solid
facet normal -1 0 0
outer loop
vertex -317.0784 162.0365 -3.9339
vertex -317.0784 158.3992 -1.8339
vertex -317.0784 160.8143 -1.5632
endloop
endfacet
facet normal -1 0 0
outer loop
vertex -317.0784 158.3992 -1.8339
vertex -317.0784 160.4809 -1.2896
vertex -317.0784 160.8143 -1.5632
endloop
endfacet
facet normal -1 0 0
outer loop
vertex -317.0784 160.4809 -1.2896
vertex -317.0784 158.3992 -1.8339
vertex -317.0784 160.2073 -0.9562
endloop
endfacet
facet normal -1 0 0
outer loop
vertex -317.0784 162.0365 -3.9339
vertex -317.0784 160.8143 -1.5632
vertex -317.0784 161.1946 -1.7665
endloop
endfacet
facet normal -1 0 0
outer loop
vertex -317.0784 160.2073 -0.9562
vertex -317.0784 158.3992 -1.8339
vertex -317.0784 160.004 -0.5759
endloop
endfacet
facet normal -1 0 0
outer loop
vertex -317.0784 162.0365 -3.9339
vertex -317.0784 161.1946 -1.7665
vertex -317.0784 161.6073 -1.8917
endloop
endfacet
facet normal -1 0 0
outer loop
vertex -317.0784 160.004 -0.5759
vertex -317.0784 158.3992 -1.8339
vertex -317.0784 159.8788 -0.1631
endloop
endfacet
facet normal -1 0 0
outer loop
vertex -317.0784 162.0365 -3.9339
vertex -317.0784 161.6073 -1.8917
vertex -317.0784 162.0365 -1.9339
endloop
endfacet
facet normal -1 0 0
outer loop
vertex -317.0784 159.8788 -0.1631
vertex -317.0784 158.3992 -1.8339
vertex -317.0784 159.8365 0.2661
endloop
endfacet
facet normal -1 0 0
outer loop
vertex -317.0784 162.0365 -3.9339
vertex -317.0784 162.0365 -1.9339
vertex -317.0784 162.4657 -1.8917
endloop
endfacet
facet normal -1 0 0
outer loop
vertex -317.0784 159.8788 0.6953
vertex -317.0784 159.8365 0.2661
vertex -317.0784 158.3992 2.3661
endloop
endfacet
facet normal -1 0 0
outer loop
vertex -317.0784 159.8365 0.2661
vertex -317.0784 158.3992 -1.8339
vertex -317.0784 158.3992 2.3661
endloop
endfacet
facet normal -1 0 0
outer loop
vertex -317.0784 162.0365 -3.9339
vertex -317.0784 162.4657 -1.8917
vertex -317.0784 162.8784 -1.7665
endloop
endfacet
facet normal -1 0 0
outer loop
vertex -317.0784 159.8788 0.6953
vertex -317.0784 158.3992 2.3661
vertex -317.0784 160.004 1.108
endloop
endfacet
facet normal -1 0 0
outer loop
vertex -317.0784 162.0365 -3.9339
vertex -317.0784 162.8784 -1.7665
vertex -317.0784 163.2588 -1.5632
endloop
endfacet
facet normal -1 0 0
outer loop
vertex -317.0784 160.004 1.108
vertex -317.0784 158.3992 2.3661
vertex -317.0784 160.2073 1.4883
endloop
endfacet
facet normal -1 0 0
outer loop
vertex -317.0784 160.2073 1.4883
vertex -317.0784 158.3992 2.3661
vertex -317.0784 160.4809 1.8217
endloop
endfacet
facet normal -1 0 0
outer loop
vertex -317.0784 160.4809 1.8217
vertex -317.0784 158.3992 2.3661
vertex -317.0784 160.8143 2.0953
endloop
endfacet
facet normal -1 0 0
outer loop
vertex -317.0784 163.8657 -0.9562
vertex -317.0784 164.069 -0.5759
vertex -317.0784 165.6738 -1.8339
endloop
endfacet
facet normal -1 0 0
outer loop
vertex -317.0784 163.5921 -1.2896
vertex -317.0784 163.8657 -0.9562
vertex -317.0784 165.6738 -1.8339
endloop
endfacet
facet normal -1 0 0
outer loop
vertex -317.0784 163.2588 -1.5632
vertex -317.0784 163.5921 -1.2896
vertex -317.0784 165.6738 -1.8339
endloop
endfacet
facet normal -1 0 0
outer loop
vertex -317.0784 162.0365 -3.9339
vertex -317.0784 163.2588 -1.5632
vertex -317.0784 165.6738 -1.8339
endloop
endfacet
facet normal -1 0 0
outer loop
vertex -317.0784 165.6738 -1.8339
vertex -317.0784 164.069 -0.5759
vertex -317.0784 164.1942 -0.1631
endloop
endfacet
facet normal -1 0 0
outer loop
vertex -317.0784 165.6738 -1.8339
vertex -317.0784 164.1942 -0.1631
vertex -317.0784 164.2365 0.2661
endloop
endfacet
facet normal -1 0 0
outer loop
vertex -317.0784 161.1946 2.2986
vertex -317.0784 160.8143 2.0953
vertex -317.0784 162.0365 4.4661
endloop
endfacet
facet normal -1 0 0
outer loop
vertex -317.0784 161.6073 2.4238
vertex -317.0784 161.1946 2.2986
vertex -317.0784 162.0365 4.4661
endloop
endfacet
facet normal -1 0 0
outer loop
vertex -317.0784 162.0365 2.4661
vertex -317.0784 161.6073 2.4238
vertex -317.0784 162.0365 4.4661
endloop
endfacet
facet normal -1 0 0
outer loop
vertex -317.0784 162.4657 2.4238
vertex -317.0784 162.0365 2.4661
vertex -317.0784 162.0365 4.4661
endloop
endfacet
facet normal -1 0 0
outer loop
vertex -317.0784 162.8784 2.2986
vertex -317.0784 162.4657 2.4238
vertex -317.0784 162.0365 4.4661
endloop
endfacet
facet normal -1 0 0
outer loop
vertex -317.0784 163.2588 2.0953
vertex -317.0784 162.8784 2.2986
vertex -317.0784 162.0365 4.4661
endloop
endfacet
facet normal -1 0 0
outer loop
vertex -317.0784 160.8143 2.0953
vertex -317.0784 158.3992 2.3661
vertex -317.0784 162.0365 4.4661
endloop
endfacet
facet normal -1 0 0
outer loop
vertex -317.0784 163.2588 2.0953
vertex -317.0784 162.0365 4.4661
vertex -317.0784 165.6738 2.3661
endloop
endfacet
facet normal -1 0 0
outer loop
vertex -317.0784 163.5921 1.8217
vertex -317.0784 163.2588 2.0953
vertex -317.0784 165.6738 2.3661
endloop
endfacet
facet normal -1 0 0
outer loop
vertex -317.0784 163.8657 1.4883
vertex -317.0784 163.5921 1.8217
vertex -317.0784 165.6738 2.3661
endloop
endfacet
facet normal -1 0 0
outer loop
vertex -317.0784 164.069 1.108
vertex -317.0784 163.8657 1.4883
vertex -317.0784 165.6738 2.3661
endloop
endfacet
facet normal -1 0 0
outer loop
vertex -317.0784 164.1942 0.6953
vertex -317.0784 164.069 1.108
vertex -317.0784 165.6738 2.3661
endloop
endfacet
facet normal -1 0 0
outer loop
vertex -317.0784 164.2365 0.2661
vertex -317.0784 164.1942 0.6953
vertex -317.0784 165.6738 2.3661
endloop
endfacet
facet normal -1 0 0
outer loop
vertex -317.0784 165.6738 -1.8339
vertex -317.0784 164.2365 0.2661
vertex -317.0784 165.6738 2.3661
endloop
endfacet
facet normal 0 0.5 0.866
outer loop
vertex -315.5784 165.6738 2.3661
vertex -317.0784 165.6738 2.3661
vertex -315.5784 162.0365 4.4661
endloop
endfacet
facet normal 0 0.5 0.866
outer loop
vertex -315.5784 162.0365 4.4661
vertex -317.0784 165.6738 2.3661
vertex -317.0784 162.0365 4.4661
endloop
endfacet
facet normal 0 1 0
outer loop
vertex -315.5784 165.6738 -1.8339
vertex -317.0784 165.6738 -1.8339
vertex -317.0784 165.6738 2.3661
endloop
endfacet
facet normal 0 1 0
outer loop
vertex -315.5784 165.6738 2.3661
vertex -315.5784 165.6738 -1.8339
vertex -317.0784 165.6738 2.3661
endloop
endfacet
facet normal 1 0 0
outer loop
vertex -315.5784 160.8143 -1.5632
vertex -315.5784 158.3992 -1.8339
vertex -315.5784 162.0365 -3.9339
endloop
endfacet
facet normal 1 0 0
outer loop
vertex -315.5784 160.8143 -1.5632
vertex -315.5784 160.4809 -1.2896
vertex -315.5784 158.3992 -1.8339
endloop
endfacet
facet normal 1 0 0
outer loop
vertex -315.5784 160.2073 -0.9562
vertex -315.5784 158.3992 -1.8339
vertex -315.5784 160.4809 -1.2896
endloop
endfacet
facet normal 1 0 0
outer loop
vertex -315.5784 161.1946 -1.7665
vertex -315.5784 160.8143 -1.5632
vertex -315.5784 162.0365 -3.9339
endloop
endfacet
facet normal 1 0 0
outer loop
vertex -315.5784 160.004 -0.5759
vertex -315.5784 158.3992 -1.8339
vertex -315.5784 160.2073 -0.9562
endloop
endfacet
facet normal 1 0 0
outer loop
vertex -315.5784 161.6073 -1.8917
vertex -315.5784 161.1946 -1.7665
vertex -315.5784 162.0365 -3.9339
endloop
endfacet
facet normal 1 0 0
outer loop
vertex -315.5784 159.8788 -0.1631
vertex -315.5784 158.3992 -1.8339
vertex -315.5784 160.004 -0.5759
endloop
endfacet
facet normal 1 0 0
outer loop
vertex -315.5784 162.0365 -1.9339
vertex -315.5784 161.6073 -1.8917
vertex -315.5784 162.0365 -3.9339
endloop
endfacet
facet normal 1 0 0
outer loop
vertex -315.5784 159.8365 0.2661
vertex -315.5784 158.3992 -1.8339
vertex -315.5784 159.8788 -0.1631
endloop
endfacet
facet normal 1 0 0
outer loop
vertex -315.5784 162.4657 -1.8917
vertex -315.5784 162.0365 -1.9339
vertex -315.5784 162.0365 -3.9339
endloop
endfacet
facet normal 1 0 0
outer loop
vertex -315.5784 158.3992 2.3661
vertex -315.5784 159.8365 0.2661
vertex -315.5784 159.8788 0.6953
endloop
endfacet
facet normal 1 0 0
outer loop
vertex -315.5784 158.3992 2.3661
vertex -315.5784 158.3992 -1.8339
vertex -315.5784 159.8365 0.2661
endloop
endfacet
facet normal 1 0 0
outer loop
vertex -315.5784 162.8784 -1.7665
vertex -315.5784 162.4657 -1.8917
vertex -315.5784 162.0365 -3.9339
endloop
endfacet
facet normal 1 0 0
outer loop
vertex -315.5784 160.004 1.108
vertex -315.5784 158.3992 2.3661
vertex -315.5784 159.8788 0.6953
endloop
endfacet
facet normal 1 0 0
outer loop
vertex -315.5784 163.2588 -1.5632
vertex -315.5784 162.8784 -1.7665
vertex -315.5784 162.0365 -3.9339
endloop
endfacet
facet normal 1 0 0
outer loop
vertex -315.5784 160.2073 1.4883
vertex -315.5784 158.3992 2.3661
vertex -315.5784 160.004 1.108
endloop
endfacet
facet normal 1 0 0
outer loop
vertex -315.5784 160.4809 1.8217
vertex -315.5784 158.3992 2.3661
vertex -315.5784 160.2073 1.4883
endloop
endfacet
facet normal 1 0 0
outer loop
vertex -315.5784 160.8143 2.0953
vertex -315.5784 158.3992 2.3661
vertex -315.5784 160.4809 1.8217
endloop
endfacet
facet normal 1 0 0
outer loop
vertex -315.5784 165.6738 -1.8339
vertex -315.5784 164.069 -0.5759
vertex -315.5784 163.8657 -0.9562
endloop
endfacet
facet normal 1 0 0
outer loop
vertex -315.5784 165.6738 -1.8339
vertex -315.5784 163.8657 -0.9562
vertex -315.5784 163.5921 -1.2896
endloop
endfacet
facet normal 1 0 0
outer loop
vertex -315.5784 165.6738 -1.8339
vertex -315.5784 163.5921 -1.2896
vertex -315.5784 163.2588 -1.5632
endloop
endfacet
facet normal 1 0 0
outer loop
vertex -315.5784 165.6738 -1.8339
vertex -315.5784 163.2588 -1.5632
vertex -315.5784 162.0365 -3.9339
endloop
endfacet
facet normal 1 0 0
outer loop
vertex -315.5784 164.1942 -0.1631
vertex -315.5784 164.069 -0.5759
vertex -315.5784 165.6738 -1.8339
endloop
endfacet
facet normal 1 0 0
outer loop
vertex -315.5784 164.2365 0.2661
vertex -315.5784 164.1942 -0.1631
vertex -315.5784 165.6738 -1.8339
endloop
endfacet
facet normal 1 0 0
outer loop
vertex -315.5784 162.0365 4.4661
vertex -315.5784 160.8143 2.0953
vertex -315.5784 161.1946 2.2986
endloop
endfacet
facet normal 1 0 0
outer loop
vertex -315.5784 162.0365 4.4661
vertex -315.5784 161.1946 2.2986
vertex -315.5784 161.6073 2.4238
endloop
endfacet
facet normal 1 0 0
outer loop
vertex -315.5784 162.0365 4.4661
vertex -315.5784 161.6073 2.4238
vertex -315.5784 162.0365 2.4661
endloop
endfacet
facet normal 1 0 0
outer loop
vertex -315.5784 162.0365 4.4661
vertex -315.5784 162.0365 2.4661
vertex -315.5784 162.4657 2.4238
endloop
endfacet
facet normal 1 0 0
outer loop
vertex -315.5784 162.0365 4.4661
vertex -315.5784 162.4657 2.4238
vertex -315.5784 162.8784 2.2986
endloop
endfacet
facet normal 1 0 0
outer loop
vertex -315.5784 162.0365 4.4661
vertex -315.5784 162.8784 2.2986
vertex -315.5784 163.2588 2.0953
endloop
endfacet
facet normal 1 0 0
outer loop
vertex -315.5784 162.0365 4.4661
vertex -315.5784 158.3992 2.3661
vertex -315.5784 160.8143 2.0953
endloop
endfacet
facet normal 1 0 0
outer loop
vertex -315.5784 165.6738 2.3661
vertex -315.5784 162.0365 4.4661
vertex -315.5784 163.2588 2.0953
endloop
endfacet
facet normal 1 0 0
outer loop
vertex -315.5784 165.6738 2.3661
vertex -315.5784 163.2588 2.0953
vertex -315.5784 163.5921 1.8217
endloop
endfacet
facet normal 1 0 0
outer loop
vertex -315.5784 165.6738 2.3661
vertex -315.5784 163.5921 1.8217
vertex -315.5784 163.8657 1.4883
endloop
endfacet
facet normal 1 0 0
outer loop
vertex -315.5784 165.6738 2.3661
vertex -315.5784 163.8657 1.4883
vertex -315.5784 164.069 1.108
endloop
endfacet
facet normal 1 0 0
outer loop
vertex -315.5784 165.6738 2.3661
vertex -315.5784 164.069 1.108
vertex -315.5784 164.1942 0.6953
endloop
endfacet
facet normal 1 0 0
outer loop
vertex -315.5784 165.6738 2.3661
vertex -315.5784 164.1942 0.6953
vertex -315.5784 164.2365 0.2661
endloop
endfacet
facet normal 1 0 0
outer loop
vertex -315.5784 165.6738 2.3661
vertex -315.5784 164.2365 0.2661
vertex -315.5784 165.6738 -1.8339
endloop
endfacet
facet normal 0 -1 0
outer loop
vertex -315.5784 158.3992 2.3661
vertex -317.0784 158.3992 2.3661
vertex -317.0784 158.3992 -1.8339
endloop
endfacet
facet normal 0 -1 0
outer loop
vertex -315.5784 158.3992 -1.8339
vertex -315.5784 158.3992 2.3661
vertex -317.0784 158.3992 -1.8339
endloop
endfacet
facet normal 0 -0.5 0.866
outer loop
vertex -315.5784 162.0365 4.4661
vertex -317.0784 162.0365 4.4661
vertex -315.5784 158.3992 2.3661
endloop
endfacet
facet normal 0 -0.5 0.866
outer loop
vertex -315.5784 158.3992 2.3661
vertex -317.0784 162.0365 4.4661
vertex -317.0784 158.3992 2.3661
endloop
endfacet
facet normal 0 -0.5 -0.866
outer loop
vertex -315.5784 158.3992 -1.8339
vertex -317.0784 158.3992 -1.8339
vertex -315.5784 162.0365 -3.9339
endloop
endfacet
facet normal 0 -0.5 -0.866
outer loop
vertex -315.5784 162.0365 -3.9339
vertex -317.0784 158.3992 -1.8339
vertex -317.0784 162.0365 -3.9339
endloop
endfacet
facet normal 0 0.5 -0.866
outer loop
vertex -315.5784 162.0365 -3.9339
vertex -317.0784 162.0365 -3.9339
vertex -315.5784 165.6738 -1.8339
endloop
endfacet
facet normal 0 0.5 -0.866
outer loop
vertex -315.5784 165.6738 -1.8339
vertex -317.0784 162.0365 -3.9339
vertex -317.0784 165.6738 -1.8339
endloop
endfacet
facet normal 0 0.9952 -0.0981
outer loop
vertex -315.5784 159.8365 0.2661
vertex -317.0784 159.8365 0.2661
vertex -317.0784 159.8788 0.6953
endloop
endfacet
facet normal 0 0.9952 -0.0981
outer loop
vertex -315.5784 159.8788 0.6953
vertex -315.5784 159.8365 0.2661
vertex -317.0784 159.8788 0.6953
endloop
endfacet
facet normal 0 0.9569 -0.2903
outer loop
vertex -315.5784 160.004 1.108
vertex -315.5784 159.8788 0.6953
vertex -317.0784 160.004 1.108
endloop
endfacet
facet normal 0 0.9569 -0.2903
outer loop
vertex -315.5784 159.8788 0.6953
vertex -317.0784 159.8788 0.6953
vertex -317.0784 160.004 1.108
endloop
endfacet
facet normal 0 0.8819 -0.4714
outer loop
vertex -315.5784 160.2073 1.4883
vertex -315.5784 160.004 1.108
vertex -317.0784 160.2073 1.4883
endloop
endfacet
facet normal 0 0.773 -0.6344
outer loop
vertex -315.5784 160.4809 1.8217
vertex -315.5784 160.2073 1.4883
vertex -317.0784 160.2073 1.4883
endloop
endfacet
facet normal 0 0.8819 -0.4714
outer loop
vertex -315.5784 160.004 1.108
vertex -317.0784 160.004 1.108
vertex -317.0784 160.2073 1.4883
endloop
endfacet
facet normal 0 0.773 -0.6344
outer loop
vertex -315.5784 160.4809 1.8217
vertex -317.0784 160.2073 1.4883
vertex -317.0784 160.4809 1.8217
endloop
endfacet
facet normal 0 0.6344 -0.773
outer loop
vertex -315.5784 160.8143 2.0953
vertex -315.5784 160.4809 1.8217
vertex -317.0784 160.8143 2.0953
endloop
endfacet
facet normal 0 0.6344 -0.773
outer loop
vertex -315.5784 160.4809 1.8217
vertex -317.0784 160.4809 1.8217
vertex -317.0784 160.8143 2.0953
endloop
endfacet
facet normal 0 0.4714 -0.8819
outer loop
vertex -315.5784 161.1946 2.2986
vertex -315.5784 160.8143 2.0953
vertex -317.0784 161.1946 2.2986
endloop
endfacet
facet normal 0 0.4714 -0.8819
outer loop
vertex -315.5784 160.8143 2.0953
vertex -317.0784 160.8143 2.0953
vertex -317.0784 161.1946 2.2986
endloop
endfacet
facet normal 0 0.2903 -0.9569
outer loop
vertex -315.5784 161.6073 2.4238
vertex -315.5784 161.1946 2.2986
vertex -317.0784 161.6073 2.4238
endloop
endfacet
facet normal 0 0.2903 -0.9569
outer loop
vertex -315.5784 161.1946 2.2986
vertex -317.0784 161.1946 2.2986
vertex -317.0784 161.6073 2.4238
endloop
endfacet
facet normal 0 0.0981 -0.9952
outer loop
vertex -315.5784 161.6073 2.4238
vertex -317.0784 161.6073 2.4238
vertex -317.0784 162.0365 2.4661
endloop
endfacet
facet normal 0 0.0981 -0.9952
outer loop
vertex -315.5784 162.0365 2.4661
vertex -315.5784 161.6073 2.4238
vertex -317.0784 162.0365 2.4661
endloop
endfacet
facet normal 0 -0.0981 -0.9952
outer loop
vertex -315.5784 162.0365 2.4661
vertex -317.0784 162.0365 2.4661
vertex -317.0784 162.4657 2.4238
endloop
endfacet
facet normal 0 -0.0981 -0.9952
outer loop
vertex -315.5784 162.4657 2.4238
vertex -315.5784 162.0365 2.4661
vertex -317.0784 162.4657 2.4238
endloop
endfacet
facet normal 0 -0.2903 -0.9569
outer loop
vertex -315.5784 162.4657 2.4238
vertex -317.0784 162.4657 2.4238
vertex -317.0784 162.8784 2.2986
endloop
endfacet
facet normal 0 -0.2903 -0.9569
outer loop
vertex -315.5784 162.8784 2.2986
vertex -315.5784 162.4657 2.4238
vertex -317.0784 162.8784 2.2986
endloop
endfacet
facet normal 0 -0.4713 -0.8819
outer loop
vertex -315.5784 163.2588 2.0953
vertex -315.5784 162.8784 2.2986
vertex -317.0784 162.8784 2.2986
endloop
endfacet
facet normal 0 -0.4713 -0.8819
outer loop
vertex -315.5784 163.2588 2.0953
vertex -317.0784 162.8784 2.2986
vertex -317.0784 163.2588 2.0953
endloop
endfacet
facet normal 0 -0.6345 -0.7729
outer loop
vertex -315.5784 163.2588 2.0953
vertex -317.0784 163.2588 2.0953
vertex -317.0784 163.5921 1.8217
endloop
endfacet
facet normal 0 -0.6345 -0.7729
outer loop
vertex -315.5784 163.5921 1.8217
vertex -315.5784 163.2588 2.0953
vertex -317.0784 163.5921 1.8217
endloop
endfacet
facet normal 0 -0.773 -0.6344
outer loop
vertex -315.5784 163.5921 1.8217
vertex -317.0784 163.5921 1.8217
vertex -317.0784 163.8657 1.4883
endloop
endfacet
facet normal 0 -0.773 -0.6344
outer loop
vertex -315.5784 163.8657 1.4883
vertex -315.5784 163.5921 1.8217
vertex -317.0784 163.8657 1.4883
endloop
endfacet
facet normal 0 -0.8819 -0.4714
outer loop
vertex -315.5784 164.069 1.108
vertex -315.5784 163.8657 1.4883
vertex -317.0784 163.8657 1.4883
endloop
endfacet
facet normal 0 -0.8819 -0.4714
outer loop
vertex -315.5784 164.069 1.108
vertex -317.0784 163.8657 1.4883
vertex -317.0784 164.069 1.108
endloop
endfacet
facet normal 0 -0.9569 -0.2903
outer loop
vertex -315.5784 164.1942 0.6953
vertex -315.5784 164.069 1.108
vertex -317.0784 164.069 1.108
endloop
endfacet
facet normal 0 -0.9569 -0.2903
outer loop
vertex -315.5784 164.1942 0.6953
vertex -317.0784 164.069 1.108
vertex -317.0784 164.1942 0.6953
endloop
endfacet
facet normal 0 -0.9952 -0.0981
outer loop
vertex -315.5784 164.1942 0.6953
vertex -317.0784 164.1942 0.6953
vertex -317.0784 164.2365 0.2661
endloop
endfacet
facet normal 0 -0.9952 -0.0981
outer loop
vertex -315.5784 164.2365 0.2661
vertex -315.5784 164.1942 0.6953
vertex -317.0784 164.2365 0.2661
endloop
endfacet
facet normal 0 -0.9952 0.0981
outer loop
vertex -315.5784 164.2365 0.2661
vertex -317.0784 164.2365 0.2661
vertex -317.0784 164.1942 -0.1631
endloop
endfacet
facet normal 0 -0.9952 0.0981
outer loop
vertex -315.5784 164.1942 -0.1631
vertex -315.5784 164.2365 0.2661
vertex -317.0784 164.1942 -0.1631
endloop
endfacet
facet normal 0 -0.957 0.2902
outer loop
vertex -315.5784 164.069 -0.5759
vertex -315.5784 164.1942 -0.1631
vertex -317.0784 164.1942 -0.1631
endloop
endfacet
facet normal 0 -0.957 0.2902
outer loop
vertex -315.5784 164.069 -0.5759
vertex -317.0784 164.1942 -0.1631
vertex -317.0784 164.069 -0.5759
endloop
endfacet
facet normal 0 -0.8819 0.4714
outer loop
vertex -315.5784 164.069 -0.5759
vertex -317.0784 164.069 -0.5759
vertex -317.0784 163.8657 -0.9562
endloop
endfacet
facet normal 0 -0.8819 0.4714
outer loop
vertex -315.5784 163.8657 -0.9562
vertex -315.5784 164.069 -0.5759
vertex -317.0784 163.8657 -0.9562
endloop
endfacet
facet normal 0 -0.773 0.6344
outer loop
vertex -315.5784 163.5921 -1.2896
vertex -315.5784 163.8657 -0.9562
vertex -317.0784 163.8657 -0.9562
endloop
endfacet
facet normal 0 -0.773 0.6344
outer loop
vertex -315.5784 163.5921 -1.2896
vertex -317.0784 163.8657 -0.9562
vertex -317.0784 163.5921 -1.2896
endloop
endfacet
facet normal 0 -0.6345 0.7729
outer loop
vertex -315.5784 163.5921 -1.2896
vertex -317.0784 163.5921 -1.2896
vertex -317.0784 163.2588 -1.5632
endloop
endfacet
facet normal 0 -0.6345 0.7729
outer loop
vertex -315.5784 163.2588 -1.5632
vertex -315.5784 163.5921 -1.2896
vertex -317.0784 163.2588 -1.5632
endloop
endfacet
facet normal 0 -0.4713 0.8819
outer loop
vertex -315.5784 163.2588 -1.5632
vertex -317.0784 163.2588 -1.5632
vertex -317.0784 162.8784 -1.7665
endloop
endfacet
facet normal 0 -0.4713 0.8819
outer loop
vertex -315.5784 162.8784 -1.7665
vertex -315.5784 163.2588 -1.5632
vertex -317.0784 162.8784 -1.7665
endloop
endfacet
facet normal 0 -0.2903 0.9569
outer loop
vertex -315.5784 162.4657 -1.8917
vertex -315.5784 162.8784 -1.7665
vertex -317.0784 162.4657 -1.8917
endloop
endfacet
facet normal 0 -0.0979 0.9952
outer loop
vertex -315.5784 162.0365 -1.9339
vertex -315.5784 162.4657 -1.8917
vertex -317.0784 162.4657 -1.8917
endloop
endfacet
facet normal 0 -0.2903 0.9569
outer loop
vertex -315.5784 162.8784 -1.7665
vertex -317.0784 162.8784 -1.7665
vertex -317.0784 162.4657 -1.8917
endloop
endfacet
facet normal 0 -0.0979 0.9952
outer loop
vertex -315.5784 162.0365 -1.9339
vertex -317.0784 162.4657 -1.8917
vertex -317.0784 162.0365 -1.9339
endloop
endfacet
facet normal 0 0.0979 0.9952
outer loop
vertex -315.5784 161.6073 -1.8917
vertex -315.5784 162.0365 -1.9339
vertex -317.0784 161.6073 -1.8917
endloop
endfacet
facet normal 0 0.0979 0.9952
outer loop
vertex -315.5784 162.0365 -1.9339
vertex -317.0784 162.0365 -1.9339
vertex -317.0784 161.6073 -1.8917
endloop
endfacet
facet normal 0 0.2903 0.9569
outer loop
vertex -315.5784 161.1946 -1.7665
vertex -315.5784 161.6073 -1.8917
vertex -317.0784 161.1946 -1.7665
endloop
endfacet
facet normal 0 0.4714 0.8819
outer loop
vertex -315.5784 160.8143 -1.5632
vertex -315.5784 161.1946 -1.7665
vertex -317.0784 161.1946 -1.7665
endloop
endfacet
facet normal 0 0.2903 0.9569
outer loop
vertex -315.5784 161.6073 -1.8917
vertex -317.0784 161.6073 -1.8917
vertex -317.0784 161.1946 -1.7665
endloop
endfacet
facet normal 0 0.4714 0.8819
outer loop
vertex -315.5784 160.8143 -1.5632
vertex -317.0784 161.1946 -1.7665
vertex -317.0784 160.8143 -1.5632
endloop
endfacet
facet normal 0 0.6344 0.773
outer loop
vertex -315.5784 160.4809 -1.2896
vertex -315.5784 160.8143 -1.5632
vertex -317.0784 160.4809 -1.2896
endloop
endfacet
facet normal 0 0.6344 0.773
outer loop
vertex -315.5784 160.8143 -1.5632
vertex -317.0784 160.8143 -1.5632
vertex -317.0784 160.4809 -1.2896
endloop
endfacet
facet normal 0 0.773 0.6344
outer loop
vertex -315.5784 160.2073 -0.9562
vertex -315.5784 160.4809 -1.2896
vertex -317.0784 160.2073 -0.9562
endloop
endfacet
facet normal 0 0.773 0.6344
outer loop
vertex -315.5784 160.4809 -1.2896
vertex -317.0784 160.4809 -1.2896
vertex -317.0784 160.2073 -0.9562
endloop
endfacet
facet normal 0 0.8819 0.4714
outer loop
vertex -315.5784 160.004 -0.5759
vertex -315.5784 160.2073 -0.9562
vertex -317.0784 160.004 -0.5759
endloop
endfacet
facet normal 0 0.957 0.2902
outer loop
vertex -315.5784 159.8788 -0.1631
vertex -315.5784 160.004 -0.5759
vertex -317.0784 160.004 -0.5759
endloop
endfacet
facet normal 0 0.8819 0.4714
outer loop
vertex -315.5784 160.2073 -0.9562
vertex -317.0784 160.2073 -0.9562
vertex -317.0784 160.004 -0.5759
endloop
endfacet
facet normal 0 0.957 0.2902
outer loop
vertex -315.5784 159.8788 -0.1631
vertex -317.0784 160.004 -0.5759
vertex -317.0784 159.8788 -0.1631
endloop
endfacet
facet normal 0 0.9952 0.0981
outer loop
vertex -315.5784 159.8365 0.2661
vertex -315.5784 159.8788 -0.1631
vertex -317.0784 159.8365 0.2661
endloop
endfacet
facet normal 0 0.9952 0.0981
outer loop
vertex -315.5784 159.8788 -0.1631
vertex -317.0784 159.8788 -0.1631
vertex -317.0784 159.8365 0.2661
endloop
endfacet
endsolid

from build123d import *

# Parameters (mm, degrees)
CIRCLE023_R        = 2.2
EXTRUSION080_DEPTH = 24.9014
EXTRUSION079_DEPTH = 1.5


with BuildPart() as extrusion080:
    # Circle023 → Extrusion080 (new body)
    with BuildSketch(Plane(origin=(-317.078363, 162.03651, 0.266052), x_dir=(0, -1, 0), z_dir=(-1, 0, 0))):
        Circle(CIRCLE023_R)
    extrude(amount=-EXTRUSION080_DEPTH)


with BuildPart() as cut010012012:
    # Wire006 → Extrusion079 (new body)
    with BuildSketch(Plane(origin=(-317.078363, 158.399203, -1.833948), x_dir=(0, -1, 0), z_dir=(-1, 0, 0))):
        Polygon((0, 0), (-3.637307, -2.1), (-7.274613, 0), (-7.274613, 4.2), (-3.637307, 6.3), (0, 4.2), align=None)
    extrude(amount=-EXTRUSION079_DEPTH)

    # Cut010012012: cut Extrusion080
    add(extrusion080.part, mode=Mode.SUBTRACT)


solid = cut010012012.part
